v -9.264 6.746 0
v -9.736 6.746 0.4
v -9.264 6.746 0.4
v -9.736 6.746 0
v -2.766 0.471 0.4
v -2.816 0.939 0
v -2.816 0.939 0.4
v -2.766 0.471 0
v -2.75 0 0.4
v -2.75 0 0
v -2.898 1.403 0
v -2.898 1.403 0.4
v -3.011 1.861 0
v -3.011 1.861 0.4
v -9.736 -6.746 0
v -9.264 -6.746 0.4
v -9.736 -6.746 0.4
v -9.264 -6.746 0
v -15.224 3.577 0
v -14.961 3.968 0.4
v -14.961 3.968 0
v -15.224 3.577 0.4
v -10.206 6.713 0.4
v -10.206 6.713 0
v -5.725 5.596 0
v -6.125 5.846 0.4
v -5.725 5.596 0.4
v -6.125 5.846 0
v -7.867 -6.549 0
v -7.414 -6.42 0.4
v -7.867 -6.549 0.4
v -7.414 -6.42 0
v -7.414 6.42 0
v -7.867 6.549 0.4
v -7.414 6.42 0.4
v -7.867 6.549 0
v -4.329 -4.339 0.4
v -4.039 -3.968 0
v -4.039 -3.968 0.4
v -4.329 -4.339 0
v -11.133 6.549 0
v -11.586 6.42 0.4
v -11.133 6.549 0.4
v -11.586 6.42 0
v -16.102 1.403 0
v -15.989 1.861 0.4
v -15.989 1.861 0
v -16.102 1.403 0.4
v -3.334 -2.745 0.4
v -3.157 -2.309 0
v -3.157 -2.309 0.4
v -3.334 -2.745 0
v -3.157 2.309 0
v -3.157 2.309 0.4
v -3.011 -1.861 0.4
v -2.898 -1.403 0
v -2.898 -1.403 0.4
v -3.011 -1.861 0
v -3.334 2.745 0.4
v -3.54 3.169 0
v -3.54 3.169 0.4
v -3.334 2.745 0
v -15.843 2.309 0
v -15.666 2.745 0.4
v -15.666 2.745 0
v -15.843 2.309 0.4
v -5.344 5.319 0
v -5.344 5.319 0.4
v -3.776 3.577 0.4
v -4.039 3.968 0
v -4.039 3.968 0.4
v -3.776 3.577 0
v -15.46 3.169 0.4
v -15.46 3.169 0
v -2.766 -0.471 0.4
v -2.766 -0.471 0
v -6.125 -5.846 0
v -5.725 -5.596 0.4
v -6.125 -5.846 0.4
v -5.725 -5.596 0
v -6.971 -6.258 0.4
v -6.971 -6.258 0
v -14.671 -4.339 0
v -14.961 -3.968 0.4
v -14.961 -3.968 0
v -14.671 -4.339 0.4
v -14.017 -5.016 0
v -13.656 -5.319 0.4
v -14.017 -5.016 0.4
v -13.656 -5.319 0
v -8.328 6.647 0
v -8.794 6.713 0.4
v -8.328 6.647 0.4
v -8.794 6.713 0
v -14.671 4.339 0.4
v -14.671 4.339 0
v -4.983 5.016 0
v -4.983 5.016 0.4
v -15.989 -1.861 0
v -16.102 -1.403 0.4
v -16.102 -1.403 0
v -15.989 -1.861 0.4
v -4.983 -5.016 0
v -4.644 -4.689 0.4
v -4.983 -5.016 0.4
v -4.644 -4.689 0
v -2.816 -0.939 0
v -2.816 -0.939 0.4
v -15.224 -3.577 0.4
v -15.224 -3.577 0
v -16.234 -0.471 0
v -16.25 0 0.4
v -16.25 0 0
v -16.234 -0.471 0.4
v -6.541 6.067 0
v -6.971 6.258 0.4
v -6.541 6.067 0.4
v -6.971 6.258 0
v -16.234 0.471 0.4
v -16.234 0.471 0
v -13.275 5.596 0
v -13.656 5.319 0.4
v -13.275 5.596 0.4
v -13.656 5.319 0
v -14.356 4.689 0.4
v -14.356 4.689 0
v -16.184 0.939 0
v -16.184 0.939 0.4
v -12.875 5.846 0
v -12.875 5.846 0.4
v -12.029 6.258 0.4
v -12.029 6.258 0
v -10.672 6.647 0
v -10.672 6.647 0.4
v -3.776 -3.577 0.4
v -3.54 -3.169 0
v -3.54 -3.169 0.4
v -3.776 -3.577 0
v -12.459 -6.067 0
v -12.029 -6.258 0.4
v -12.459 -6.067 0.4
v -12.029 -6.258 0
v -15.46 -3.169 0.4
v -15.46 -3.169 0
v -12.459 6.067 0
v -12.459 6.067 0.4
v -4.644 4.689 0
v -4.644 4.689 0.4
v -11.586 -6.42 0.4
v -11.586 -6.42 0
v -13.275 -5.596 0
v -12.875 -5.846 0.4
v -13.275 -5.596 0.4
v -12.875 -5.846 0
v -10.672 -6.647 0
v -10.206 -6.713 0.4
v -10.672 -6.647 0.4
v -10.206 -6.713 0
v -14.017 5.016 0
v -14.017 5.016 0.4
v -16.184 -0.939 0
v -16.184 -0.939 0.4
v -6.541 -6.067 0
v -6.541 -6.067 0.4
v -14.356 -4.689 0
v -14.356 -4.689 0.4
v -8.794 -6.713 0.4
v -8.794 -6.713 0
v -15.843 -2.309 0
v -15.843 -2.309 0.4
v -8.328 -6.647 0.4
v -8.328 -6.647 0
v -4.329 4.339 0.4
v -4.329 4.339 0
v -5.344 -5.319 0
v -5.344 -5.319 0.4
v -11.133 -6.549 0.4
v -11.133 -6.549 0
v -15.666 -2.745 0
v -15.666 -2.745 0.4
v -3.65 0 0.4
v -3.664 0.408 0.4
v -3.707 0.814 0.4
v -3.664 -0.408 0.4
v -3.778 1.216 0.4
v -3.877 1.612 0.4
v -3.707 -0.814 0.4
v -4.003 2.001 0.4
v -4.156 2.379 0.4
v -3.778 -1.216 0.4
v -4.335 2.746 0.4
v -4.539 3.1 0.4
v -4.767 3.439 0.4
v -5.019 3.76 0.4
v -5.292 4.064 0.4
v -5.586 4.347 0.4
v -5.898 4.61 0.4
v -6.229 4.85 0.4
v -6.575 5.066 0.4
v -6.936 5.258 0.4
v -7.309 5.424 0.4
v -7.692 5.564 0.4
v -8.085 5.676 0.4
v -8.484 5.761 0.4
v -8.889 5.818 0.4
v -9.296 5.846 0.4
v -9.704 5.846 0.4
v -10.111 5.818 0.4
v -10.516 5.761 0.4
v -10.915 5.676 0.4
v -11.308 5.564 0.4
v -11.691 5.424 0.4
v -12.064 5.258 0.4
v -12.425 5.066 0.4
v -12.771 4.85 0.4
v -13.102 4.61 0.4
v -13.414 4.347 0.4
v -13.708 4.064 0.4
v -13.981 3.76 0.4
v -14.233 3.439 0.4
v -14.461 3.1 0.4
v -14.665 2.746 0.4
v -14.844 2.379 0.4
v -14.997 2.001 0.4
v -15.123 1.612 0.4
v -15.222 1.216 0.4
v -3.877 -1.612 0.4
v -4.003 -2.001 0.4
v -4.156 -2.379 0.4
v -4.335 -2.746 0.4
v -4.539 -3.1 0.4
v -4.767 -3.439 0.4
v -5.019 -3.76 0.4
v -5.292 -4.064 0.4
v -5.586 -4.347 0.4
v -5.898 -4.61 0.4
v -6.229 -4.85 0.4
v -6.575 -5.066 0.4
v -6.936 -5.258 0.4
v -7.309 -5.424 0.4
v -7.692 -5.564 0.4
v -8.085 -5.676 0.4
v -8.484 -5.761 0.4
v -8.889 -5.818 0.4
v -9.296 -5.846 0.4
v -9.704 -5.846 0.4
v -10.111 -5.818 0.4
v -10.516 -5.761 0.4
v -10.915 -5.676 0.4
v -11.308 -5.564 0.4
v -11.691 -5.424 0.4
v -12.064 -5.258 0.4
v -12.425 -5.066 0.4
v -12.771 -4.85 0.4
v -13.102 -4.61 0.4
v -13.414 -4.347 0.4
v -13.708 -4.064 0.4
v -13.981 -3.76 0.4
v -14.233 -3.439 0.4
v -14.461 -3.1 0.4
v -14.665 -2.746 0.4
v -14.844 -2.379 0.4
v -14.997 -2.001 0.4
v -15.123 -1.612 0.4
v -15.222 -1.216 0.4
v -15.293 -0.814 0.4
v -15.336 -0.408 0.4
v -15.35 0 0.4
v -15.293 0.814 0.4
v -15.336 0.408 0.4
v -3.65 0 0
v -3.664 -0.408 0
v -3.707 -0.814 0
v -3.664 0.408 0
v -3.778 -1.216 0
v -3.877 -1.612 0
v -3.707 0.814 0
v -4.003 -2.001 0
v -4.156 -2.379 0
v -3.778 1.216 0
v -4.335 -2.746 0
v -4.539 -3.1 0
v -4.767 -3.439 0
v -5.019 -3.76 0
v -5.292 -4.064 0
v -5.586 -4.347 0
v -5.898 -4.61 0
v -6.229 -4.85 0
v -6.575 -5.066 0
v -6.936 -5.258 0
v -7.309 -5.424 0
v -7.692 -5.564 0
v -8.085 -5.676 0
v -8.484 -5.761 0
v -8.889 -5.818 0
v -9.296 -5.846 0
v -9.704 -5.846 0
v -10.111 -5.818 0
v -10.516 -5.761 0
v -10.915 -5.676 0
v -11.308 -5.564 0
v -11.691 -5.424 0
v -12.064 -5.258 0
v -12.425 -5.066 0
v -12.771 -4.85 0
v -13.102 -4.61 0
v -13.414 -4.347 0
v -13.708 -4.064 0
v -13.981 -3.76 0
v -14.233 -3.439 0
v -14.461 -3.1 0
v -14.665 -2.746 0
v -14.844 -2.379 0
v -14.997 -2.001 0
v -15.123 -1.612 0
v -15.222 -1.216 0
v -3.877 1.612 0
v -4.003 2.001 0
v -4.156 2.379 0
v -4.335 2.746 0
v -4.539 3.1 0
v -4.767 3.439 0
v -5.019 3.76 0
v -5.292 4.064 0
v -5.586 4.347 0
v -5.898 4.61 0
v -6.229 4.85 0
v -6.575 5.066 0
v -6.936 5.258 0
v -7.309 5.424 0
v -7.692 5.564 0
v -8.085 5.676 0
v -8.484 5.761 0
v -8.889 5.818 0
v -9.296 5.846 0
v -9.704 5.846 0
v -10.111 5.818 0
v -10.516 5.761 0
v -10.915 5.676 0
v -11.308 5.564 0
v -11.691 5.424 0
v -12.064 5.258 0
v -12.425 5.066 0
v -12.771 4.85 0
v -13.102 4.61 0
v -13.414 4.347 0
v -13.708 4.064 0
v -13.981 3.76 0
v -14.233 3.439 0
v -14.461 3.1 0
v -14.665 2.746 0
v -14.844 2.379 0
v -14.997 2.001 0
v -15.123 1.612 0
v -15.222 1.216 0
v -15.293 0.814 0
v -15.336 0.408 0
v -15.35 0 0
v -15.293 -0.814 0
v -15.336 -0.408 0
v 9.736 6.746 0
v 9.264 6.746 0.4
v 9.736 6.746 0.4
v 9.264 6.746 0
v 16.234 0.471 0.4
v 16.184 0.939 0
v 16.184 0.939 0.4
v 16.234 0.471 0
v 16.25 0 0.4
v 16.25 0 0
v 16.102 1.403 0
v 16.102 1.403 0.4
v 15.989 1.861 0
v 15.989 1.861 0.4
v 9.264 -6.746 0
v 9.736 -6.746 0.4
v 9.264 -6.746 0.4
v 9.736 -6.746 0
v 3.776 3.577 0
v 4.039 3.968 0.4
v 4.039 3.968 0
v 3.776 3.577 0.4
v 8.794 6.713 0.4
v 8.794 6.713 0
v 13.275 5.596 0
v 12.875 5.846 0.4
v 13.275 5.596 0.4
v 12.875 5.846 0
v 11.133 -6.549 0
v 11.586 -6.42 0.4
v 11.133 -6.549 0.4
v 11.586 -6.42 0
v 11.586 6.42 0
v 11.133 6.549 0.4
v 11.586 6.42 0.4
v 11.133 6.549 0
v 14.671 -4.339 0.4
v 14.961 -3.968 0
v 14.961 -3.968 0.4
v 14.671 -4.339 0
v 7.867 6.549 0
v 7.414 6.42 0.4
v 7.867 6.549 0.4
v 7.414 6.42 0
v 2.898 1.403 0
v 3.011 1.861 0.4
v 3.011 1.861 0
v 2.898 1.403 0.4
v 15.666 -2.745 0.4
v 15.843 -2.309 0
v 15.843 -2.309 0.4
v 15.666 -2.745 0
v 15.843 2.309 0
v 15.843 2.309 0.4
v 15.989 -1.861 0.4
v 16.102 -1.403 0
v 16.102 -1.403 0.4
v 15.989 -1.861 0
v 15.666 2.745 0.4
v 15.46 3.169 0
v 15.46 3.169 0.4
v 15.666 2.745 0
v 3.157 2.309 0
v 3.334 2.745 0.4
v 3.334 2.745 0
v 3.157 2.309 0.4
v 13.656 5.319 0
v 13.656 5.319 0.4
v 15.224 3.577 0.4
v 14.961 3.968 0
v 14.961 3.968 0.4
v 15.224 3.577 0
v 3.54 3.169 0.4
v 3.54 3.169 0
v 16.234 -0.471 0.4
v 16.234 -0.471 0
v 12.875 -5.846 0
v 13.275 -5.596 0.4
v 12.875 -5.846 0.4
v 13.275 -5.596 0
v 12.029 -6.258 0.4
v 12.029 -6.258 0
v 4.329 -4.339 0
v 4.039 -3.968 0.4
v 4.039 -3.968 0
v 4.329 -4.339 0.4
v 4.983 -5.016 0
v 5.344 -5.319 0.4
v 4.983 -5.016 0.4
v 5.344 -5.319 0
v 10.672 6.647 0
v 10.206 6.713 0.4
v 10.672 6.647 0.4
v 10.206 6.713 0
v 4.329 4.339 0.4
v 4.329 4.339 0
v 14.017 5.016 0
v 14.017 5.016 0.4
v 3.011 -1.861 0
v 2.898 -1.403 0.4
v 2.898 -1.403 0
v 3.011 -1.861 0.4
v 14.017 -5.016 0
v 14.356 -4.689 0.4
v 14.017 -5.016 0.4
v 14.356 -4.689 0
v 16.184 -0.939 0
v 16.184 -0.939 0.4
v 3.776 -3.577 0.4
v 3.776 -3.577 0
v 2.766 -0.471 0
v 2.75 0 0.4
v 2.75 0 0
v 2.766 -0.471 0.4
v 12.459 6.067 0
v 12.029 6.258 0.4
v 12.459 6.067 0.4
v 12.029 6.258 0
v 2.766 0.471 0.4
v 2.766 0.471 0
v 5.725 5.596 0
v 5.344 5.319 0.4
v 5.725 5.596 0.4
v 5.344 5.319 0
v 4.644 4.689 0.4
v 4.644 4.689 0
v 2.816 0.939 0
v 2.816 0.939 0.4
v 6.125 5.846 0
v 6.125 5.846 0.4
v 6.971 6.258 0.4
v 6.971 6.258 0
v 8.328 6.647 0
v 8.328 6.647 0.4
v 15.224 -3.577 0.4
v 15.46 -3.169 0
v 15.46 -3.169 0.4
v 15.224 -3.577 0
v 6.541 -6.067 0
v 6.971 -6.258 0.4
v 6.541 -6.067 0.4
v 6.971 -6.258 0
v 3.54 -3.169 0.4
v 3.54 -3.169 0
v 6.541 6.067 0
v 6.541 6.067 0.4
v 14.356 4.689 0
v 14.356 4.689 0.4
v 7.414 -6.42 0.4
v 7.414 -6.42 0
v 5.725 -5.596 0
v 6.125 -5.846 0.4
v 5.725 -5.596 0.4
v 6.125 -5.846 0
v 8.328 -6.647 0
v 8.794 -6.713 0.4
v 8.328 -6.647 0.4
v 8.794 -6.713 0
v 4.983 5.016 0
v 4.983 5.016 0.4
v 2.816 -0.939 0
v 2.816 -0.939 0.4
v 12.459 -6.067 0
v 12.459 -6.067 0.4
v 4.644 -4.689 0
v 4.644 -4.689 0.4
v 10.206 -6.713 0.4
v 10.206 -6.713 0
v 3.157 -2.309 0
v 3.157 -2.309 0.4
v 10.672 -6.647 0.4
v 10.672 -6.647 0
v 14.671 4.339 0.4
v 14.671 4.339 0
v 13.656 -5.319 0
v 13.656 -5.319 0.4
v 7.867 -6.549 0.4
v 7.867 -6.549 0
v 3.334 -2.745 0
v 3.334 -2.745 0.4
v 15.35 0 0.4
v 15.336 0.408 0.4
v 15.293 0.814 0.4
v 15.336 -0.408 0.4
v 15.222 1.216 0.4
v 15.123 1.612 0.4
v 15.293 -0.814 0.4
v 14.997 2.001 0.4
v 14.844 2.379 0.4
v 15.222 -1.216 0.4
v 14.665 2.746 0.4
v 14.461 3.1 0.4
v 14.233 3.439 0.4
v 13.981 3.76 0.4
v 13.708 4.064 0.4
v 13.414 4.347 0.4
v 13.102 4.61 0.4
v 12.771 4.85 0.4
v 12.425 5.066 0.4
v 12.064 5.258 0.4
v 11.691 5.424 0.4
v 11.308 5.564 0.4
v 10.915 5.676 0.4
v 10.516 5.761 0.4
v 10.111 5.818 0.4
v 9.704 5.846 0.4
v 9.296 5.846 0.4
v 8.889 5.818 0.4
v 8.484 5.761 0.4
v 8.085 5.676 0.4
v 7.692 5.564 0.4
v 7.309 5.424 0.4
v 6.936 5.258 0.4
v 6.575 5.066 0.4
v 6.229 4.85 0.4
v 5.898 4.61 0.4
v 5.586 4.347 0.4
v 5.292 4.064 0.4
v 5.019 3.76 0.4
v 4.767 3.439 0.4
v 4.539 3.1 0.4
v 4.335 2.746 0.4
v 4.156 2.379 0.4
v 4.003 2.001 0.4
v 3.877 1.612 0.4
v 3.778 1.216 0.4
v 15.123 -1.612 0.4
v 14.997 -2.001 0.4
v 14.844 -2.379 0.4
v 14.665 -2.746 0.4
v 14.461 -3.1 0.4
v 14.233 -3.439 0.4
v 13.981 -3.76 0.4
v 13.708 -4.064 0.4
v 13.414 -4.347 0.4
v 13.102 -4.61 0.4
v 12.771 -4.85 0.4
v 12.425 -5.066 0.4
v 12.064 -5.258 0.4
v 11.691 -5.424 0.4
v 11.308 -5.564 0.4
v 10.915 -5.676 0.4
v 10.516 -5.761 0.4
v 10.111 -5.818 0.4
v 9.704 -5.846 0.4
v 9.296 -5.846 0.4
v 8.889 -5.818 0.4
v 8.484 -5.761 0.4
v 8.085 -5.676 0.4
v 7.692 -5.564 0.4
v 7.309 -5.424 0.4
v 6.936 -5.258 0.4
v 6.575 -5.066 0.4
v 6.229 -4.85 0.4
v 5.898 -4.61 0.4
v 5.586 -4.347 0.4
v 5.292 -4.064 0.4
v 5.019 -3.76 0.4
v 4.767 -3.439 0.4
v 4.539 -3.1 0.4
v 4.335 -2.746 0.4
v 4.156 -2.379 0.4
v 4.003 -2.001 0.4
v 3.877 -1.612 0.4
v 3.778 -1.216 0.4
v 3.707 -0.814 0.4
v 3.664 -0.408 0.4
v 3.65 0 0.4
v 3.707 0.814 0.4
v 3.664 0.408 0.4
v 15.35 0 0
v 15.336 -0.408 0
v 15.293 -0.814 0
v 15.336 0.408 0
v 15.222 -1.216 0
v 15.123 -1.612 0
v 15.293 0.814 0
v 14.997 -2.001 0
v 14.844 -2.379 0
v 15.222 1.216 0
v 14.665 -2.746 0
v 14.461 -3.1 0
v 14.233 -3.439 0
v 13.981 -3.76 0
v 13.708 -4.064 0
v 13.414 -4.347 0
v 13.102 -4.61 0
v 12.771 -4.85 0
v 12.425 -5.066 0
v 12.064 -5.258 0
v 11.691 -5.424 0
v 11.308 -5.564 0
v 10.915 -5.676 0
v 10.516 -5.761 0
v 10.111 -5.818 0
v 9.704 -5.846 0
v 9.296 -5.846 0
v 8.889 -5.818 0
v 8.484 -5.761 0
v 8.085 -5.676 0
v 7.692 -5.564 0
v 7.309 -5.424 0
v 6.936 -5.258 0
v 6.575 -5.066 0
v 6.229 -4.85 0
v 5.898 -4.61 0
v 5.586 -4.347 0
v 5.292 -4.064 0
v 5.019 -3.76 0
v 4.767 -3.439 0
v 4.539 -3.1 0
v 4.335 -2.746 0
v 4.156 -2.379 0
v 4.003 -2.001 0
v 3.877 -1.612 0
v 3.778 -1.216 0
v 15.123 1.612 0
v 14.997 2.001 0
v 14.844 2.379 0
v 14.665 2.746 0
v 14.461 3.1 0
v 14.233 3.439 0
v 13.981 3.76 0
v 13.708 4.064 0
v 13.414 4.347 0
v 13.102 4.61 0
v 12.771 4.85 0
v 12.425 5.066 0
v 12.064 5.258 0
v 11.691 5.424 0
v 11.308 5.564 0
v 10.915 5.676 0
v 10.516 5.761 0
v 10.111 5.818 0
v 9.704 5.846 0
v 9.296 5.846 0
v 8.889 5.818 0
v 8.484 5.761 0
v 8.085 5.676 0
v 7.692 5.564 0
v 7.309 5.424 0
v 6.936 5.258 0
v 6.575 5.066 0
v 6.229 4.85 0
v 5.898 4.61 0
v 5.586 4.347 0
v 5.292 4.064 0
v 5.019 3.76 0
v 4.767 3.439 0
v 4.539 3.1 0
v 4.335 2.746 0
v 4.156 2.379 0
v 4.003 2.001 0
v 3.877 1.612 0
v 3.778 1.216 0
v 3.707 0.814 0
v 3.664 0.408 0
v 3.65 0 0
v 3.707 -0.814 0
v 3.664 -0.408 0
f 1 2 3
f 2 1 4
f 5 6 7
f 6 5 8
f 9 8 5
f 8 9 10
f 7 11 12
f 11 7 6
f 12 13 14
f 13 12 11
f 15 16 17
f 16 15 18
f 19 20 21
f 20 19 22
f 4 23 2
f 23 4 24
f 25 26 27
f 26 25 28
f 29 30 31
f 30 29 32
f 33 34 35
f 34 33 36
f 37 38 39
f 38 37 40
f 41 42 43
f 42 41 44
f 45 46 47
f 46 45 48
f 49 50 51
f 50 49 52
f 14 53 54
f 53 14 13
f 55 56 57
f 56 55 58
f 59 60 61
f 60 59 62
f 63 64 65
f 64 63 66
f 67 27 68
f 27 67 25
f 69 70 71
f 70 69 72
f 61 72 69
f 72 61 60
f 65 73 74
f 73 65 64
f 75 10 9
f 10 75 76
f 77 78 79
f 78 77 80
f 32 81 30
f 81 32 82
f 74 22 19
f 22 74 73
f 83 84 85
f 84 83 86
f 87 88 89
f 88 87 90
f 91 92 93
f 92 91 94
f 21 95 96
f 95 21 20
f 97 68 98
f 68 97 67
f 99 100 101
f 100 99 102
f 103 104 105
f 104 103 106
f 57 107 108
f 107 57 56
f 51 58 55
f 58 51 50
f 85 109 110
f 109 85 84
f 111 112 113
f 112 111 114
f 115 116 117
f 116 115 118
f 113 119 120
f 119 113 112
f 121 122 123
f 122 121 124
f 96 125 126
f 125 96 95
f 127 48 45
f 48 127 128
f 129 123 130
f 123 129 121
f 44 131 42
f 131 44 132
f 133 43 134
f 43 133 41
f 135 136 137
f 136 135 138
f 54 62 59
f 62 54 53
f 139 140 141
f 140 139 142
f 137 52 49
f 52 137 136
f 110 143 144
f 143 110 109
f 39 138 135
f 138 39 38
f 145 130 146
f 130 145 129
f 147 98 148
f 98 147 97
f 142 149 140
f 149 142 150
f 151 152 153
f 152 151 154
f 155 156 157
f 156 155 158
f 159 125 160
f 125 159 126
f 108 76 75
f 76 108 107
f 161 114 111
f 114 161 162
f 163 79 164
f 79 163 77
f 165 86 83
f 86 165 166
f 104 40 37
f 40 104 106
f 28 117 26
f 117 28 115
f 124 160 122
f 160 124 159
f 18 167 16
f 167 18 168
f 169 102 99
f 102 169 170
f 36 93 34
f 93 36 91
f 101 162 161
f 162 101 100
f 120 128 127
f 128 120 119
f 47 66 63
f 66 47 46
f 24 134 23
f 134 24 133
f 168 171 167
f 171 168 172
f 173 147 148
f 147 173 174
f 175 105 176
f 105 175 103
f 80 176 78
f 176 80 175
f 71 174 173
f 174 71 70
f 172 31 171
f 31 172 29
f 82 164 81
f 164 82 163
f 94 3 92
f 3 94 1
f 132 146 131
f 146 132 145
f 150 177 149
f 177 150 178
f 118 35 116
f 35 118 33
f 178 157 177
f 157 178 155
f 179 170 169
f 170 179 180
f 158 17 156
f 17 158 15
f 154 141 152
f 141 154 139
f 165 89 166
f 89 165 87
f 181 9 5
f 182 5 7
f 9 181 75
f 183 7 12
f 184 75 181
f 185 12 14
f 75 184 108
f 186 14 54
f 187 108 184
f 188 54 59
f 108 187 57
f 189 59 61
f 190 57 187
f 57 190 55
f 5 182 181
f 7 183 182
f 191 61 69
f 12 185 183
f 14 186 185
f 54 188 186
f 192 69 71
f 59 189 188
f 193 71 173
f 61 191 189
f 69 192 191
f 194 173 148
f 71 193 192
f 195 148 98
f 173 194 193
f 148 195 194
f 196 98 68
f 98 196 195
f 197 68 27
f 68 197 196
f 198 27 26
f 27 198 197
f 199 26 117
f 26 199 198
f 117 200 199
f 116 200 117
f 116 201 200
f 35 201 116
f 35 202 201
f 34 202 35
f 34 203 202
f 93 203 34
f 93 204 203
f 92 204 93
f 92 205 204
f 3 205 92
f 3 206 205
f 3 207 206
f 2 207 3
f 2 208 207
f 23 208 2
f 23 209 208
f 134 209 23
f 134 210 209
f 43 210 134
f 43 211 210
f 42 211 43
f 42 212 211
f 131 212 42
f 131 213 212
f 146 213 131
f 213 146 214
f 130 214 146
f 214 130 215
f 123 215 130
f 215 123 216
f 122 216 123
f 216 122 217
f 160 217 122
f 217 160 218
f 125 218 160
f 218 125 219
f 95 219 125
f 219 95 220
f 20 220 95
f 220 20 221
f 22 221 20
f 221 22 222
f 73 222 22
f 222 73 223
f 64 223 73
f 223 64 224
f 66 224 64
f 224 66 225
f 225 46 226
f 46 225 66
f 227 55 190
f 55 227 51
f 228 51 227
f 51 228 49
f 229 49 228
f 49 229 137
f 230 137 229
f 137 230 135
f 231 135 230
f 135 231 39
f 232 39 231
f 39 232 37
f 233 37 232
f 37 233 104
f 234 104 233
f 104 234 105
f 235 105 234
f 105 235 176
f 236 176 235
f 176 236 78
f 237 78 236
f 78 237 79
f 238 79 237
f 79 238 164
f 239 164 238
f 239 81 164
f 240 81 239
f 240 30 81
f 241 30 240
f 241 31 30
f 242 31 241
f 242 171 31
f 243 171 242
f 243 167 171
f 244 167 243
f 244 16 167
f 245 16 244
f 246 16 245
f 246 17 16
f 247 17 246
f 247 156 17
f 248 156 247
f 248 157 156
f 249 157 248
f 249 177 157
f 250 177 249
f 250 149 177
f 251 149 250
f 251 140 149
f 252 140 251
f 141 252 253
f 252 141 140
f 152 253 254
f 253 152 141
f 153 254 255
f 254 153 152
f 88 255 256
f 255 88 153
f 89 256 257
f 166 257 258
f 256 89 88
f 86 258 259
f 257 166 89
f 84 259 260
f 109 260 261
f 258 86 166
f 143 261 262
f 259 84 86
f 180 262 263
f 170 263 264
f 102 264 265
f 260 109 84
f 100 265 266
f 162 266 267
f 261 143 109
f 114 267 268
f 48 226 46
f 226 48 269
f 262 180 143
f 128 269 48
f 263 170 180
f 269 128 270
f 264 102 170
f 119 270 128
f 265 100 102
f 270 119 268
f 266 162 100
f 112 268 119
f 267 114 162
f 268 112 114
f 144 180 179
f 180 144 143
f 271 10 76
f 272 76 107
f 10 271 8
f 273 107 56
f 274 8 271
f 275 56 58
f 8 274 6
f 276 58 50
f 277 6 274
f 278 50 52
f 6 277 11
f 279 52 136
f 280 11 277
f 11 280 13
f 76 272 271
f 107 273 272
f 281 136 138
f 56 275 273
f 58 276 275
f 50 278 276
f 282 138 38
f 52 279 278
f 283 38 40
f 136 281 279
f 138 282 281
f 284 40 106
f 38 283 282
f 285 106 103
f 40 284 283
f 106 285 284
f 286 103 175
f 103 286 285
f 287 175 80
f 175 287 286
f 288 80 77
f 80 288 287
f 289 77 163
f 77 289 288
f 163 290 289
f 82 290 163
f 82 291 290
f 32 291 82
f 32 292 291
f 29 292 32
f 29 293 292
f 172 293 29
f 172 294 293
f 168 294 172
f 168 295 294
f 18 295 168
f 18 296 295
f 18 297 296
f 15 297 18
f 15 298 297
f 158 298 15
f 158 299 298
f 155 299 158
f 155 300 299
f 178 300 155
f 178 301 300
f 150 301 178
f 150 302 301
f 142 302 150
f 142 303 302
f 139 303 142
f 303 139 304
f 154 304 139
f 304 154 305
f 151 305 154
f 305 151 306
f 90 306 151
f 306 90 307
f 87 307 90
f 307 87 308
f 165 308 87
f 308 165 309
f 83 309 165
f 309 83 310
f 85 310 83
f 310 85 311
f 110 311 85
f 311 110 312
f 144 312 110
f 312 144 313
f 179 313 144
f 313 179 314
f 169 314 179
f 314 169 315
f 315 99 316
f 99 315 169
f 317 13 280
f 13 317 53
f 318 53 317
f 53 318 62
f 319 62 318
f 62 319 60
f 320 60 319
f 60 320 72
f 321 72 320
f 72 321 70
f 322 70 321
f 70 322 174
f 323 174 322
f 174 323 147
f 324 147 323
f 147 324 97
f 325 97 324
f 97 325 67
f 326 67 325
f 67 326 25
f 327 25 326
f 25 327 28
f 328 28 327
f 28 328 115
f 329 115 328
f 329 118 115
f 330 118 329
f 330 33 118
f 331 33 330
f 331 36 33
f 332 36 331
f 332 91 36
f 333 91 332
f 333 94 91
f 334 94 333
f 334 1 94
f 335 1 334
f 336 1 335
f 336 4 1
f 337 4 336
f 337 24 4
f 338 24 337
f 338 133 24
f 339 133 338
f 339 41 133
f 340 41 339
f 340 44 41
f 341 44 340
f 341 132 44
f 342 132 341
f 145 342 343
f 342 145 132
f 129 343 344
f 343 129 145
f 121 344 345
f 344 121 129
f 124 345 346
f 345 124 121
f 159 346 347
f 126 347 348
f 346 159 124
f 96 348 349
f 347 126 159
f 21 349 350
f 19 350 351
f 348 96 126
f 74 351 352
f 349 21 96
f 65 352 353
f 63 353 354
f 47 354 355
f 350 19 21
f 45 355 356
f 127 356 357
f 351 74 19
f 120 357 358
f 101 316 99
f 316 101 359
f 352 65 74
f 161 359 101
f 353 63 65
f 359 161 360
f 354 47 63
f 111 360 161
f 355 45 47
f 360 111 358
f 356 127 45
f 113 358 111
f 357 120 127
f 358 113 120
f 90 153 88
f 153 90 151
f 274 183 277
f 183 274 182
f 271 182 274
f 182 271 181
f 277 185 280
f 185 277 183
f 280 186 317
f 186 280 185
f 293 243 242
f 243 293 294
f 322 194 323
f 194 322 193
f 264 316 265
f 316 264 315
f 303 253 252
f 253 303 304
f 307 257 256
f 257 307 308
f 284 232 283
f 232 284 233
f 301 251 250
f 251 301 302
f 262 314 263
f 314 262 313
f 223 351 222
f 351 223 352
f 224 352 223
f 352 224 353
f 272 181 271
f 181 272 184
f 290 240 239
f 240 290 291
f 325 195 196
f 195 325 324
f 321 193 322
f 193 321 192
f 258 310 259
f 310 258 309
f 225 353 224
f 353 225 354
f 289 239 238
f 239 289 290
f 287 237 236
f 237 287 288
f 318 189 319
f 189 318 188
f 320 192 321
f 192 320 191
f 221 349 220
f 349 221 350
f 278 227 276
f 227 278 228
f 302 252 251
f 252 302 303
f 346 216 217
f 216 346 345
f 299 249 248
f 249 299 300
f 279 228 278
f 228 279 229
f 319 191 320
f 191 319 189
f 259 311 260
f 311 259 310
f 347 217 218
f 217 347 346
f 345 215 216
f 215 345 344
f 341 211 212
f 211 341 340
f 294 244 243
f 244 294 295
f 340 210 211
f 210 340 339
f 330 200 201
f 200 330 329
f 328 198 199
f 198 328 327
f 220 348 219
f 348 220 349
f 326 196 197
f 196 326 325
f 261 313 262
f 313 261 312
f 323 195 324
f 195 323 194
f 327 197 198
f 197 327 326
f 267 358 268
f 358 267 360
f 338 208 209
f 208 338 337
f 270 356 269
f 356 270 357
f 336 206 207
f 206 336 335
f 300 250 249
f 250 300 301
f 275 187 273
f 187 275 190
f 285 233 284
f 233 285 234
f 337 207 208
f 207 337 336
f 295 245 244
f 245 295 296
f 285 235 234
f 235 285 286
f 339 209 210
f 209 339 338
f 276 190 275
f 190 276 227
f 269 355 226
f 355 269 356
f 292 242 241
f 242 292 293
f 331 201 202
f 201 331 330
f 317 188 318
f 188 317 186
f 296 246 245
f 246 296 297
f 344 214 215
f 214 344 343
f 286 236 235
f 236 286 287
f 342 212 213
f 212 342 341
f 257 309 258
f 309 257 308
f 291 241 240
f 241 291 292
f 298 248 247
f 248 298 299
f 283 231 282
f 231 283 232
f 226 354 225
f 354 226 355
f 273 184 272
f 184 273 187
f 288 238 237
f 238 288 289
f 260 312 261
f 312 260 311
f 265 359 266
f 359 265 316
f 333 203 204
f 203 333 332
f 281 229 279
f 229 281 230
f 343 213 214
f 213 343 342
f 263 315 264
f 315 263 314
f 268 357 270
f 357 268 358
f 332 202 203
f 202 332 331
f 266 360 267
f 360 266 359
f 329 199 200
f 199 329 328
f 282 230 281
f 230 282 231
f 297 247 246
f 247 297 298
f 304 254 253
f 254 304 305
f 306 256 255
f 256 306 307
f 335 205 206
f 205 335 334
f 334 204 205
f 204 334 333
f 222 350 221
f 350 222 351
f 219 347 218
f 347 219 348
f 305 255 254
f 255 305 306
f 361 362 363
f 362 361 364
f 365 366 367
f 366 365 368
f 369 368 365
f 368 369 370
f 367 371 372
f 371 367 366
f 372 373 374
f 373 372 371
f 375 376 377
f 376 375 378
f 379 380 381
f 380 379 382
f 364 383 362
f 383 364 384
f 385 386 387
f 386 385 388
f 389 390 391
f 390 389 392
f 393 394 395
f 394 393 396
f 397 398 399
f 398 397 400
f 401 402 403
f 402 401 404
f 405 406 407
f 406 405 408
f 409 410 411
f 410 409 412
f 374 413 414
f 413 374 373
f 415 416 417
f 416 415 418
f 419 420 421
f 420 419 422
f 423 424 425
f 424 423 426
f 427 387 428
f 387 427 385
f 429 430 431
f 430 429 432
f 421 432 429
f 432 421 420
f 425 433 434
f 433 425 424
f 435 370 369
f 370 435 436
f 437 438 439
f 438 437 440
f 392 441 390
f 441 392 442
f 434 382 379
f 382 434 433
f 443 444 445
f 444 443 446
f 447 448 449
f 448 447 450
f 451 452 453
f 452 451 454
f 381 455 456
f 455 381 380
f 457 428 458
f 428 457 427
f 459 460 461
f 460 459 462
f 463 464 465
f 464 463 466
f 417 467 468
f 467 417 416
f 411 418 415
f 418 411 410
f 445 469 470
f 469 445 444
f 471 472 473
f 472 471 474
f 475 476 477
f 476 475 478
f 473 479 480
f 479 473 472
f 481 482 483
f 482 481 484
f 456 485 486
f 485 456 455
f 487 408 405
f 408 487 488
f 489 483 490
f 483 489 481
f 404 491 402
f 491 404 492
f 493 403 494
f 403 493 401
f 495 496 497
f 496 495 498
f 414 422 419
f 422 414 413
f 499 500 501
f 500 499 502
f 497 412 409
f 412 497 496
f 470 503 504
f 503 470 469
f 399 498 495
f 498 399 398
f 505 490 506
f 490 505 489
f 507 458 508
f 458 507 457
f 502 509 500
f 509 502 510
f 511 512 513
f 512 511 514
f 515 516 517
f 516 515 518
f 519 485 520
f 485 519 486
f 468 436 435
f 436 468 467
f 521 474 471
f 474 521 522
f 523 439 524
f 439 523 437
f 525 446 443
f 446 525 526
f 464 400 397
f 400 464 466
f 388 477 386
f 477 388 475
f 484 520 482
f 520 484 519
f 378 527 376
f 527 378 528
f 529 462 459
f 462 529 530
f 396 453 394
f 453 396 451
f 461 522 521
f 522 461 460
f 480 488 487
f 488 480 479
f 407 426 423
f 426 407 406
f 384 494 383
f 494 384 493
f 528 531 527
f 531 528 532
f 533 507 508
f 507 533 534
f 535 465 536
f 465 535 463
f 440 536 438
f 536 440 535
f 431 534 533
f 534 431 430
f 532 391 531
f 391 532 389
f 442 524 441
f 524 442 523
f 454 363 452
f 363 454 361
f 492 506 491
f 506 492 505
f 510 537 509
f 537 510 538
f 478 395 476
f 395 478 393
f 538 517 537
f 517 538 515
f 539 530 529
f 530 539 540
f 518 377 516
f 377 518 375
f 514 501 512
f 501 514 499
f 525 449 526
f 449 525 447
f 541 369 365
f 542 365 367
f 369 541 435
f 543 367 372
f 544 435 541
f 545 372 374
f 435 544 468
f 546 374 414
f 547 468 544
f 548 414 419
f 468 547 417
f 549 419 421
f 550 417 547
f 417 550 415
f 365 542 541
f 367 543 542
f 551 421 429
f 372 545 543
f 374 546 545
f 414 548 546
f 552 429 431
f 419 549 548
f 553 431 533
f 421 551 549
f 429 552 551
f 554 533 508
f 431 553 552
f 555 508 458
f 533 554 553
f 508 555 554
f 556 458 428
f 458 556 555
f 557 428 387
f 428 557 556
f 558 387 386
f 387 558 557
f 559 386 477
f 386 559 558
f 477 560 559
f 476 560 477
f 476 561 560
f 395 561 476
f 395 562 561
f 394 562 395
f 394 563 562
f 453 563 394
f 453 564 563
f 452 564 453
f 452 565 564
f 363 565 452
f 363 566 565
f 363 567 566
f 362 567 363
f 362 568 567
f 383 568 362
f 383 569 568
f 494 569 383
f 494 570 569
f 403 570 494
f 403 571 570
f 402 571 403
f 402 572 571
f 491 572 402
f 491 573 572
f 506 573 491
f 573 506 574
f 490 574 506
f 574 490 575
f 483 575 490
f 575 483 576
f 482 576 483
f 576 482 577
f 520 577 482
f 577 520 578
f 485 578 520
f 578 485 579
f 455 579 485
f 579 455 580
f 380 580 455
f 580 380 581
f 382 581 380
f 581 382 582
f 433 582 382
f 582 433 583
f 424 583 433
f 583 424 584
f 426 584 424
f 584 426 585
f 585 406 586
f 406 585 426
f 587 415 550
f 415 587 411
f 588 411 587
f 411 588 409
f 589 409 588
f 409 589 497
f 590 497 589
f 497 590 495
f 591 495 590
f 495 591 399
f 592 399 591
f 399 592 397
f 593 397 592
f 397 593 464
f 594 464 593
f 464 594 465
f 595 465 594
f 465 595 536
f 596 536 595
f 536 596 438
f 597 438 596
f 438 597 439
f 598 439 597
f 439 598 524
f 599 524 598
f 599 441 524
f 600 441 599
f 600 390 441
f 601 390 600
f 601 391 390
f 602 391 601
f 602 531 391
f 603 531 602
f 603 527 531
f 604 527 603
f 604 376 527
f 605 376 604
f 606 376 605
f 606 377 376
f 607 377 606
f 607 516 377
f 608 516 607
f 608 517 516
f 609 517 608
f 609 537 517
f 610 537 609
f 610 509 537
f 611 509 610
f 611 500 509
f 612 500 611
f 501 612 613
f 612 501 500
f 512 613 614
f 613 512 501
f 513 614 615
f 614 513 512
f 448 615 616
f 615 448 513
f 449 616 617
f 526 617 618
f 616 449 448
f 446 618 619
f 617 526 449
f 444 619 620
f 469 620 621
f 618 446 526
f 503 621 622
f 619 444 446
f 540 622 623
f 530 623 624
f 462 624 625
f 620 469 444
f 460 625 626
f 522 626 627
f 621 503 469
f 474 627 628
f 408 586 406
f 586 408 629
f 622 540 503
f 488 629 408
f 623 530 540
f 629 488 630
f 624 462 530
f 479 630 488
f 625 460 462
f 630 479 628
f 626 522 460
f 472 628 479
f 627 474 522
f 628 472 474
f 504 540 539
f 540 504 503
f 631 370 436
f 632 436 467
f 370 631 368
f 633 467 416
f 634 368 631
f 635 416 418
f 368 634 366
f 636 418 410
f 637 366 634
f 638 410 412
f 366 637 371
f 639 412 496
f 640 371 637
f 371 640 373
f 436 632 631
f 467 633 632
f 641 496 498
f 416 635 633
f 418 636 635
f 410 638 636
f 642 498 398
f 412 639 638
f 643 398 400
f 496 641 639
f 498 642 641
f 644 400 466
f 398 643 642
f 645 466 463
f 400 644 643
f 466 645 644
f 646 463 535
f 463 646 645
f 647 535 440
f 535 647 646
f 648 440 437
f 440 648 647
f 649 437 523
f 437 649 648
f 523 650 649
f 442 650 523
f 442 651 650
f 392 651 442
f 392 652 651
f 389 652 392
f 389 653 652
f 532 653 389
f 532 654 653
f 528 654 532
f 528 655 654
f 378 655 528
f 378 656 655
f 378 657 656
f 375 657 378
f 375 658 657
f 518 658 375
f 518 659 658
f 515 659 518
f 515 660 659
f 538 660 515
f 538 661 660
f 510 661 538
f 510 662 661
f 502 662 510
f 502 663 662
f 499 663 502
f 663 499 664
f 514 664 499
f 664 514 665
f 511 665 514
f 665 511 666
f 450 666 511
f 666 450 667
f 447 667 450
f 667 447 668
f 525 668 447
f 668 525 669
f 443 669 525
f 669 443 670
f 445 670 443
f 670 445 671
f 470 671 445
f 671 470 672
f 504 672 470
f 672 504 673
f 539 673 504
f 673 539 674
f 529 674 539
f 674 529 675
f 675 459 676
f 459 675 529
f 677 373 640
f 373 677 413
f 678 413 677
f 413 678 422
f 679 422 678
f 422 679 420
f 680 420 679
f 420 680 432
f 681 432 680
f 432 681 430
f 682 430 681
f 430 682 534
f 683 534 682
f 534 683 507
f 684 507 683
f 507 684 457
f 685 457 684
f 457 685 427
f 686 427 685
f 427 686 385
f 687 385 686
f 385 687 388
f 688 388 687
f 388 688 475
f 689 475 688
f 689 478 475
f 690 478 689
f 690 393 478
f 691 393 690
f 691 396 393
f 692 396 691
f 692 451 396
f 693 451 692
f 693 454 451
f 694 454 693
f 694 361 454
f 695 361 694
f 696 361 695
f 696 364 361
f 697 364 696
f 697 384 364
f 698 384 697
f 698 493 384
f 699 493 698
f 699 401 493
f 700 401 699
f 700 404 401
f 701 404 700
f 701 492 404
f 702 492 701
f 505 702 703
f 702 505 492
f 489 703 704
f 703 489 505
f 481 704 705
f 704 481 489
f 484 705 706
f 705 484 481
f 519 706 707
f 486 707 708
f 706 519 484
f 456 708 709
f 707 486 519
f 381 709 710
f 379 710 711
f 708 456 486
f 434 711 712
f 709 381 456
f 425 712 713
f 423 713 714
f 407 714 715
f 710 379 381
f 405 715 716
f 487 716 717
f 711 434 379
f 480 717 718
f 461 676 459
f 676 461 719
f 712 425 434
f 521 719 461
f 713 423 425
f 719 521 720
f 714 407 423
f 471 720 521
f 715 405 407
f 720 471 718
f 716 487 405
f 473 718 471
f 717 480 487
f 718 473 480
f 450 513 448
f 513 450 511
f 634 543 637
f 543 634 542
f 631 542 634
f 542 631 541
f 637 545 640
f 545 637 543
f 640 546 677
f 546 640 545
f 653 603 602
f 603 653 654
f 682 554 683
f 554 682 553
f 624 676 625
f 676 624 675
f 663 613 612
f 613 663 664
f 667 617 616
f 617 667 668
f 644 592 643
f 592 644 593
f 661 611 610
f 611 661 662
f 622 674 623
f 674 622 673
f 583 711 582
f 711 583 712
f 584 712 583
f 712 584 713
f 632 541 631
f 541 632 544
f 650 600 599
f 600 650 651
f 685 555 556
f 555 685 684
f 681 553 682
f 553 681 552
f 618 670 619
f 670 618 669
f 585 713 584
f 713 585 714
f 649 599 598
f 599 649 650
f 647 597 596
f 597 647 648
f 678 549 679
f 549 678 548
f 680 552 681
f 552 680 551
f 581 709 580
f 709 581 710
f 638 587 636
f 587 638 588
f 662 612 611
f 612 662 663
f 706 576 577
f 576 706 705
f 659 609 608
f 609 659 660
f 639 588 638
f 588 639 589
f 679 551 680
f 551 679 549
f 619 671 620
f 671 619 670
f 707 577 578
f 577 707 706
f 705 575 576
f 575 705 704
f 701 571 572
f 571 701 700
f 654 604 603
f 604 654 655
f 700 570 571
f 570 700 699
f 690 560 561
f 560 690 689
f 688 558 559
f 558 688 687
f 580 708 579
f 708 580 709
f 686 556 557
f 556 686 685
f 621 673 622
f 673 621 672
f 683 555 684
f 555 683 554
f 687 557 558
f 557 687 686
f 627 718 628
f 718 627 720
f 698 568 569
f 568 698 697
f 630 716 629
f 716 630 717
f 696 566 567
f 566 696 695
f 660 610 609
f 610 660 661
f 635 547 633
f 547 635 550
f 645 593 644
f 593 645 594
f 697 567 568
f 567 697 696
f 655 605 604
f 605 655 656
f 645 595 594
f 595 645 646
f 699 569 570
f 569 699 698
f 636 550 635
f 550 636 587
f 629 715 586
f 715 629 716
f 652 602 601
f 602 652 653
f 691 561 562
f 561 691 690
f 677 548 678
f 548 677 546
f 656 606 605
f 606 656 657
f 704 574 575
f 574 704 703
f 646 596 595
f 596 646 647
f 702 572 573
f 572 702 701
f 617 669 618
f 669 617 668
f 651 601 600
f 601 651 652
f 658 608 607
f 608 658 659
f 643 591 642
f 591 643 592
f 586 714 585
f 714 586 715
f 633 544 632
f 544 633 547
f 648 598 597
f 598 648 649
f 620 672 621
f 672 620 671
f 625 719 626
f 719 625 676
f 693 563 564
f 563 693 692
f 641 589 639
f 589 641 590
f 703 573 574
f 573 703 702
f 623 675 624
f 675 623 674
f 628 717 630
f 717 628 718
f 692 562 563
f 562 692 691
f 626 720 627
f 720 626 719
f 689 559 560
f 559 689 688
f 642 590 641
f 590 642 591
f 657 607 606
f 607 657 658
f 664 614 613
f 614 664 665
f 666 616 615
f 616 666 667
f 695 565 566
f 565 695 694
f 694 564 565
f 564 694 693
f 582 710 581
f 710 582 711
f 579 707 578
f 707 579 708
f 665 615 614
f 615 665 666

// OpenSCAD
$fn = 90;
dxy = 15;
sp = 4;
eps = 0.001;
trim = 0.3;

module jackwasher()
{
    do = 13.5;
    di = 11.4 + trim;
    t = 0.4;
    difference()
    {
        cylinder(h=t, d=do, center=false);
        translate([0, 0, -eps]) cylinder(h=t+eps*2, d=di, center=false);
    }
}

for(x = [-0.5, 0.5])
{
    translate([x * (dxy + sp), 0, 0]) jackwasher();
}
